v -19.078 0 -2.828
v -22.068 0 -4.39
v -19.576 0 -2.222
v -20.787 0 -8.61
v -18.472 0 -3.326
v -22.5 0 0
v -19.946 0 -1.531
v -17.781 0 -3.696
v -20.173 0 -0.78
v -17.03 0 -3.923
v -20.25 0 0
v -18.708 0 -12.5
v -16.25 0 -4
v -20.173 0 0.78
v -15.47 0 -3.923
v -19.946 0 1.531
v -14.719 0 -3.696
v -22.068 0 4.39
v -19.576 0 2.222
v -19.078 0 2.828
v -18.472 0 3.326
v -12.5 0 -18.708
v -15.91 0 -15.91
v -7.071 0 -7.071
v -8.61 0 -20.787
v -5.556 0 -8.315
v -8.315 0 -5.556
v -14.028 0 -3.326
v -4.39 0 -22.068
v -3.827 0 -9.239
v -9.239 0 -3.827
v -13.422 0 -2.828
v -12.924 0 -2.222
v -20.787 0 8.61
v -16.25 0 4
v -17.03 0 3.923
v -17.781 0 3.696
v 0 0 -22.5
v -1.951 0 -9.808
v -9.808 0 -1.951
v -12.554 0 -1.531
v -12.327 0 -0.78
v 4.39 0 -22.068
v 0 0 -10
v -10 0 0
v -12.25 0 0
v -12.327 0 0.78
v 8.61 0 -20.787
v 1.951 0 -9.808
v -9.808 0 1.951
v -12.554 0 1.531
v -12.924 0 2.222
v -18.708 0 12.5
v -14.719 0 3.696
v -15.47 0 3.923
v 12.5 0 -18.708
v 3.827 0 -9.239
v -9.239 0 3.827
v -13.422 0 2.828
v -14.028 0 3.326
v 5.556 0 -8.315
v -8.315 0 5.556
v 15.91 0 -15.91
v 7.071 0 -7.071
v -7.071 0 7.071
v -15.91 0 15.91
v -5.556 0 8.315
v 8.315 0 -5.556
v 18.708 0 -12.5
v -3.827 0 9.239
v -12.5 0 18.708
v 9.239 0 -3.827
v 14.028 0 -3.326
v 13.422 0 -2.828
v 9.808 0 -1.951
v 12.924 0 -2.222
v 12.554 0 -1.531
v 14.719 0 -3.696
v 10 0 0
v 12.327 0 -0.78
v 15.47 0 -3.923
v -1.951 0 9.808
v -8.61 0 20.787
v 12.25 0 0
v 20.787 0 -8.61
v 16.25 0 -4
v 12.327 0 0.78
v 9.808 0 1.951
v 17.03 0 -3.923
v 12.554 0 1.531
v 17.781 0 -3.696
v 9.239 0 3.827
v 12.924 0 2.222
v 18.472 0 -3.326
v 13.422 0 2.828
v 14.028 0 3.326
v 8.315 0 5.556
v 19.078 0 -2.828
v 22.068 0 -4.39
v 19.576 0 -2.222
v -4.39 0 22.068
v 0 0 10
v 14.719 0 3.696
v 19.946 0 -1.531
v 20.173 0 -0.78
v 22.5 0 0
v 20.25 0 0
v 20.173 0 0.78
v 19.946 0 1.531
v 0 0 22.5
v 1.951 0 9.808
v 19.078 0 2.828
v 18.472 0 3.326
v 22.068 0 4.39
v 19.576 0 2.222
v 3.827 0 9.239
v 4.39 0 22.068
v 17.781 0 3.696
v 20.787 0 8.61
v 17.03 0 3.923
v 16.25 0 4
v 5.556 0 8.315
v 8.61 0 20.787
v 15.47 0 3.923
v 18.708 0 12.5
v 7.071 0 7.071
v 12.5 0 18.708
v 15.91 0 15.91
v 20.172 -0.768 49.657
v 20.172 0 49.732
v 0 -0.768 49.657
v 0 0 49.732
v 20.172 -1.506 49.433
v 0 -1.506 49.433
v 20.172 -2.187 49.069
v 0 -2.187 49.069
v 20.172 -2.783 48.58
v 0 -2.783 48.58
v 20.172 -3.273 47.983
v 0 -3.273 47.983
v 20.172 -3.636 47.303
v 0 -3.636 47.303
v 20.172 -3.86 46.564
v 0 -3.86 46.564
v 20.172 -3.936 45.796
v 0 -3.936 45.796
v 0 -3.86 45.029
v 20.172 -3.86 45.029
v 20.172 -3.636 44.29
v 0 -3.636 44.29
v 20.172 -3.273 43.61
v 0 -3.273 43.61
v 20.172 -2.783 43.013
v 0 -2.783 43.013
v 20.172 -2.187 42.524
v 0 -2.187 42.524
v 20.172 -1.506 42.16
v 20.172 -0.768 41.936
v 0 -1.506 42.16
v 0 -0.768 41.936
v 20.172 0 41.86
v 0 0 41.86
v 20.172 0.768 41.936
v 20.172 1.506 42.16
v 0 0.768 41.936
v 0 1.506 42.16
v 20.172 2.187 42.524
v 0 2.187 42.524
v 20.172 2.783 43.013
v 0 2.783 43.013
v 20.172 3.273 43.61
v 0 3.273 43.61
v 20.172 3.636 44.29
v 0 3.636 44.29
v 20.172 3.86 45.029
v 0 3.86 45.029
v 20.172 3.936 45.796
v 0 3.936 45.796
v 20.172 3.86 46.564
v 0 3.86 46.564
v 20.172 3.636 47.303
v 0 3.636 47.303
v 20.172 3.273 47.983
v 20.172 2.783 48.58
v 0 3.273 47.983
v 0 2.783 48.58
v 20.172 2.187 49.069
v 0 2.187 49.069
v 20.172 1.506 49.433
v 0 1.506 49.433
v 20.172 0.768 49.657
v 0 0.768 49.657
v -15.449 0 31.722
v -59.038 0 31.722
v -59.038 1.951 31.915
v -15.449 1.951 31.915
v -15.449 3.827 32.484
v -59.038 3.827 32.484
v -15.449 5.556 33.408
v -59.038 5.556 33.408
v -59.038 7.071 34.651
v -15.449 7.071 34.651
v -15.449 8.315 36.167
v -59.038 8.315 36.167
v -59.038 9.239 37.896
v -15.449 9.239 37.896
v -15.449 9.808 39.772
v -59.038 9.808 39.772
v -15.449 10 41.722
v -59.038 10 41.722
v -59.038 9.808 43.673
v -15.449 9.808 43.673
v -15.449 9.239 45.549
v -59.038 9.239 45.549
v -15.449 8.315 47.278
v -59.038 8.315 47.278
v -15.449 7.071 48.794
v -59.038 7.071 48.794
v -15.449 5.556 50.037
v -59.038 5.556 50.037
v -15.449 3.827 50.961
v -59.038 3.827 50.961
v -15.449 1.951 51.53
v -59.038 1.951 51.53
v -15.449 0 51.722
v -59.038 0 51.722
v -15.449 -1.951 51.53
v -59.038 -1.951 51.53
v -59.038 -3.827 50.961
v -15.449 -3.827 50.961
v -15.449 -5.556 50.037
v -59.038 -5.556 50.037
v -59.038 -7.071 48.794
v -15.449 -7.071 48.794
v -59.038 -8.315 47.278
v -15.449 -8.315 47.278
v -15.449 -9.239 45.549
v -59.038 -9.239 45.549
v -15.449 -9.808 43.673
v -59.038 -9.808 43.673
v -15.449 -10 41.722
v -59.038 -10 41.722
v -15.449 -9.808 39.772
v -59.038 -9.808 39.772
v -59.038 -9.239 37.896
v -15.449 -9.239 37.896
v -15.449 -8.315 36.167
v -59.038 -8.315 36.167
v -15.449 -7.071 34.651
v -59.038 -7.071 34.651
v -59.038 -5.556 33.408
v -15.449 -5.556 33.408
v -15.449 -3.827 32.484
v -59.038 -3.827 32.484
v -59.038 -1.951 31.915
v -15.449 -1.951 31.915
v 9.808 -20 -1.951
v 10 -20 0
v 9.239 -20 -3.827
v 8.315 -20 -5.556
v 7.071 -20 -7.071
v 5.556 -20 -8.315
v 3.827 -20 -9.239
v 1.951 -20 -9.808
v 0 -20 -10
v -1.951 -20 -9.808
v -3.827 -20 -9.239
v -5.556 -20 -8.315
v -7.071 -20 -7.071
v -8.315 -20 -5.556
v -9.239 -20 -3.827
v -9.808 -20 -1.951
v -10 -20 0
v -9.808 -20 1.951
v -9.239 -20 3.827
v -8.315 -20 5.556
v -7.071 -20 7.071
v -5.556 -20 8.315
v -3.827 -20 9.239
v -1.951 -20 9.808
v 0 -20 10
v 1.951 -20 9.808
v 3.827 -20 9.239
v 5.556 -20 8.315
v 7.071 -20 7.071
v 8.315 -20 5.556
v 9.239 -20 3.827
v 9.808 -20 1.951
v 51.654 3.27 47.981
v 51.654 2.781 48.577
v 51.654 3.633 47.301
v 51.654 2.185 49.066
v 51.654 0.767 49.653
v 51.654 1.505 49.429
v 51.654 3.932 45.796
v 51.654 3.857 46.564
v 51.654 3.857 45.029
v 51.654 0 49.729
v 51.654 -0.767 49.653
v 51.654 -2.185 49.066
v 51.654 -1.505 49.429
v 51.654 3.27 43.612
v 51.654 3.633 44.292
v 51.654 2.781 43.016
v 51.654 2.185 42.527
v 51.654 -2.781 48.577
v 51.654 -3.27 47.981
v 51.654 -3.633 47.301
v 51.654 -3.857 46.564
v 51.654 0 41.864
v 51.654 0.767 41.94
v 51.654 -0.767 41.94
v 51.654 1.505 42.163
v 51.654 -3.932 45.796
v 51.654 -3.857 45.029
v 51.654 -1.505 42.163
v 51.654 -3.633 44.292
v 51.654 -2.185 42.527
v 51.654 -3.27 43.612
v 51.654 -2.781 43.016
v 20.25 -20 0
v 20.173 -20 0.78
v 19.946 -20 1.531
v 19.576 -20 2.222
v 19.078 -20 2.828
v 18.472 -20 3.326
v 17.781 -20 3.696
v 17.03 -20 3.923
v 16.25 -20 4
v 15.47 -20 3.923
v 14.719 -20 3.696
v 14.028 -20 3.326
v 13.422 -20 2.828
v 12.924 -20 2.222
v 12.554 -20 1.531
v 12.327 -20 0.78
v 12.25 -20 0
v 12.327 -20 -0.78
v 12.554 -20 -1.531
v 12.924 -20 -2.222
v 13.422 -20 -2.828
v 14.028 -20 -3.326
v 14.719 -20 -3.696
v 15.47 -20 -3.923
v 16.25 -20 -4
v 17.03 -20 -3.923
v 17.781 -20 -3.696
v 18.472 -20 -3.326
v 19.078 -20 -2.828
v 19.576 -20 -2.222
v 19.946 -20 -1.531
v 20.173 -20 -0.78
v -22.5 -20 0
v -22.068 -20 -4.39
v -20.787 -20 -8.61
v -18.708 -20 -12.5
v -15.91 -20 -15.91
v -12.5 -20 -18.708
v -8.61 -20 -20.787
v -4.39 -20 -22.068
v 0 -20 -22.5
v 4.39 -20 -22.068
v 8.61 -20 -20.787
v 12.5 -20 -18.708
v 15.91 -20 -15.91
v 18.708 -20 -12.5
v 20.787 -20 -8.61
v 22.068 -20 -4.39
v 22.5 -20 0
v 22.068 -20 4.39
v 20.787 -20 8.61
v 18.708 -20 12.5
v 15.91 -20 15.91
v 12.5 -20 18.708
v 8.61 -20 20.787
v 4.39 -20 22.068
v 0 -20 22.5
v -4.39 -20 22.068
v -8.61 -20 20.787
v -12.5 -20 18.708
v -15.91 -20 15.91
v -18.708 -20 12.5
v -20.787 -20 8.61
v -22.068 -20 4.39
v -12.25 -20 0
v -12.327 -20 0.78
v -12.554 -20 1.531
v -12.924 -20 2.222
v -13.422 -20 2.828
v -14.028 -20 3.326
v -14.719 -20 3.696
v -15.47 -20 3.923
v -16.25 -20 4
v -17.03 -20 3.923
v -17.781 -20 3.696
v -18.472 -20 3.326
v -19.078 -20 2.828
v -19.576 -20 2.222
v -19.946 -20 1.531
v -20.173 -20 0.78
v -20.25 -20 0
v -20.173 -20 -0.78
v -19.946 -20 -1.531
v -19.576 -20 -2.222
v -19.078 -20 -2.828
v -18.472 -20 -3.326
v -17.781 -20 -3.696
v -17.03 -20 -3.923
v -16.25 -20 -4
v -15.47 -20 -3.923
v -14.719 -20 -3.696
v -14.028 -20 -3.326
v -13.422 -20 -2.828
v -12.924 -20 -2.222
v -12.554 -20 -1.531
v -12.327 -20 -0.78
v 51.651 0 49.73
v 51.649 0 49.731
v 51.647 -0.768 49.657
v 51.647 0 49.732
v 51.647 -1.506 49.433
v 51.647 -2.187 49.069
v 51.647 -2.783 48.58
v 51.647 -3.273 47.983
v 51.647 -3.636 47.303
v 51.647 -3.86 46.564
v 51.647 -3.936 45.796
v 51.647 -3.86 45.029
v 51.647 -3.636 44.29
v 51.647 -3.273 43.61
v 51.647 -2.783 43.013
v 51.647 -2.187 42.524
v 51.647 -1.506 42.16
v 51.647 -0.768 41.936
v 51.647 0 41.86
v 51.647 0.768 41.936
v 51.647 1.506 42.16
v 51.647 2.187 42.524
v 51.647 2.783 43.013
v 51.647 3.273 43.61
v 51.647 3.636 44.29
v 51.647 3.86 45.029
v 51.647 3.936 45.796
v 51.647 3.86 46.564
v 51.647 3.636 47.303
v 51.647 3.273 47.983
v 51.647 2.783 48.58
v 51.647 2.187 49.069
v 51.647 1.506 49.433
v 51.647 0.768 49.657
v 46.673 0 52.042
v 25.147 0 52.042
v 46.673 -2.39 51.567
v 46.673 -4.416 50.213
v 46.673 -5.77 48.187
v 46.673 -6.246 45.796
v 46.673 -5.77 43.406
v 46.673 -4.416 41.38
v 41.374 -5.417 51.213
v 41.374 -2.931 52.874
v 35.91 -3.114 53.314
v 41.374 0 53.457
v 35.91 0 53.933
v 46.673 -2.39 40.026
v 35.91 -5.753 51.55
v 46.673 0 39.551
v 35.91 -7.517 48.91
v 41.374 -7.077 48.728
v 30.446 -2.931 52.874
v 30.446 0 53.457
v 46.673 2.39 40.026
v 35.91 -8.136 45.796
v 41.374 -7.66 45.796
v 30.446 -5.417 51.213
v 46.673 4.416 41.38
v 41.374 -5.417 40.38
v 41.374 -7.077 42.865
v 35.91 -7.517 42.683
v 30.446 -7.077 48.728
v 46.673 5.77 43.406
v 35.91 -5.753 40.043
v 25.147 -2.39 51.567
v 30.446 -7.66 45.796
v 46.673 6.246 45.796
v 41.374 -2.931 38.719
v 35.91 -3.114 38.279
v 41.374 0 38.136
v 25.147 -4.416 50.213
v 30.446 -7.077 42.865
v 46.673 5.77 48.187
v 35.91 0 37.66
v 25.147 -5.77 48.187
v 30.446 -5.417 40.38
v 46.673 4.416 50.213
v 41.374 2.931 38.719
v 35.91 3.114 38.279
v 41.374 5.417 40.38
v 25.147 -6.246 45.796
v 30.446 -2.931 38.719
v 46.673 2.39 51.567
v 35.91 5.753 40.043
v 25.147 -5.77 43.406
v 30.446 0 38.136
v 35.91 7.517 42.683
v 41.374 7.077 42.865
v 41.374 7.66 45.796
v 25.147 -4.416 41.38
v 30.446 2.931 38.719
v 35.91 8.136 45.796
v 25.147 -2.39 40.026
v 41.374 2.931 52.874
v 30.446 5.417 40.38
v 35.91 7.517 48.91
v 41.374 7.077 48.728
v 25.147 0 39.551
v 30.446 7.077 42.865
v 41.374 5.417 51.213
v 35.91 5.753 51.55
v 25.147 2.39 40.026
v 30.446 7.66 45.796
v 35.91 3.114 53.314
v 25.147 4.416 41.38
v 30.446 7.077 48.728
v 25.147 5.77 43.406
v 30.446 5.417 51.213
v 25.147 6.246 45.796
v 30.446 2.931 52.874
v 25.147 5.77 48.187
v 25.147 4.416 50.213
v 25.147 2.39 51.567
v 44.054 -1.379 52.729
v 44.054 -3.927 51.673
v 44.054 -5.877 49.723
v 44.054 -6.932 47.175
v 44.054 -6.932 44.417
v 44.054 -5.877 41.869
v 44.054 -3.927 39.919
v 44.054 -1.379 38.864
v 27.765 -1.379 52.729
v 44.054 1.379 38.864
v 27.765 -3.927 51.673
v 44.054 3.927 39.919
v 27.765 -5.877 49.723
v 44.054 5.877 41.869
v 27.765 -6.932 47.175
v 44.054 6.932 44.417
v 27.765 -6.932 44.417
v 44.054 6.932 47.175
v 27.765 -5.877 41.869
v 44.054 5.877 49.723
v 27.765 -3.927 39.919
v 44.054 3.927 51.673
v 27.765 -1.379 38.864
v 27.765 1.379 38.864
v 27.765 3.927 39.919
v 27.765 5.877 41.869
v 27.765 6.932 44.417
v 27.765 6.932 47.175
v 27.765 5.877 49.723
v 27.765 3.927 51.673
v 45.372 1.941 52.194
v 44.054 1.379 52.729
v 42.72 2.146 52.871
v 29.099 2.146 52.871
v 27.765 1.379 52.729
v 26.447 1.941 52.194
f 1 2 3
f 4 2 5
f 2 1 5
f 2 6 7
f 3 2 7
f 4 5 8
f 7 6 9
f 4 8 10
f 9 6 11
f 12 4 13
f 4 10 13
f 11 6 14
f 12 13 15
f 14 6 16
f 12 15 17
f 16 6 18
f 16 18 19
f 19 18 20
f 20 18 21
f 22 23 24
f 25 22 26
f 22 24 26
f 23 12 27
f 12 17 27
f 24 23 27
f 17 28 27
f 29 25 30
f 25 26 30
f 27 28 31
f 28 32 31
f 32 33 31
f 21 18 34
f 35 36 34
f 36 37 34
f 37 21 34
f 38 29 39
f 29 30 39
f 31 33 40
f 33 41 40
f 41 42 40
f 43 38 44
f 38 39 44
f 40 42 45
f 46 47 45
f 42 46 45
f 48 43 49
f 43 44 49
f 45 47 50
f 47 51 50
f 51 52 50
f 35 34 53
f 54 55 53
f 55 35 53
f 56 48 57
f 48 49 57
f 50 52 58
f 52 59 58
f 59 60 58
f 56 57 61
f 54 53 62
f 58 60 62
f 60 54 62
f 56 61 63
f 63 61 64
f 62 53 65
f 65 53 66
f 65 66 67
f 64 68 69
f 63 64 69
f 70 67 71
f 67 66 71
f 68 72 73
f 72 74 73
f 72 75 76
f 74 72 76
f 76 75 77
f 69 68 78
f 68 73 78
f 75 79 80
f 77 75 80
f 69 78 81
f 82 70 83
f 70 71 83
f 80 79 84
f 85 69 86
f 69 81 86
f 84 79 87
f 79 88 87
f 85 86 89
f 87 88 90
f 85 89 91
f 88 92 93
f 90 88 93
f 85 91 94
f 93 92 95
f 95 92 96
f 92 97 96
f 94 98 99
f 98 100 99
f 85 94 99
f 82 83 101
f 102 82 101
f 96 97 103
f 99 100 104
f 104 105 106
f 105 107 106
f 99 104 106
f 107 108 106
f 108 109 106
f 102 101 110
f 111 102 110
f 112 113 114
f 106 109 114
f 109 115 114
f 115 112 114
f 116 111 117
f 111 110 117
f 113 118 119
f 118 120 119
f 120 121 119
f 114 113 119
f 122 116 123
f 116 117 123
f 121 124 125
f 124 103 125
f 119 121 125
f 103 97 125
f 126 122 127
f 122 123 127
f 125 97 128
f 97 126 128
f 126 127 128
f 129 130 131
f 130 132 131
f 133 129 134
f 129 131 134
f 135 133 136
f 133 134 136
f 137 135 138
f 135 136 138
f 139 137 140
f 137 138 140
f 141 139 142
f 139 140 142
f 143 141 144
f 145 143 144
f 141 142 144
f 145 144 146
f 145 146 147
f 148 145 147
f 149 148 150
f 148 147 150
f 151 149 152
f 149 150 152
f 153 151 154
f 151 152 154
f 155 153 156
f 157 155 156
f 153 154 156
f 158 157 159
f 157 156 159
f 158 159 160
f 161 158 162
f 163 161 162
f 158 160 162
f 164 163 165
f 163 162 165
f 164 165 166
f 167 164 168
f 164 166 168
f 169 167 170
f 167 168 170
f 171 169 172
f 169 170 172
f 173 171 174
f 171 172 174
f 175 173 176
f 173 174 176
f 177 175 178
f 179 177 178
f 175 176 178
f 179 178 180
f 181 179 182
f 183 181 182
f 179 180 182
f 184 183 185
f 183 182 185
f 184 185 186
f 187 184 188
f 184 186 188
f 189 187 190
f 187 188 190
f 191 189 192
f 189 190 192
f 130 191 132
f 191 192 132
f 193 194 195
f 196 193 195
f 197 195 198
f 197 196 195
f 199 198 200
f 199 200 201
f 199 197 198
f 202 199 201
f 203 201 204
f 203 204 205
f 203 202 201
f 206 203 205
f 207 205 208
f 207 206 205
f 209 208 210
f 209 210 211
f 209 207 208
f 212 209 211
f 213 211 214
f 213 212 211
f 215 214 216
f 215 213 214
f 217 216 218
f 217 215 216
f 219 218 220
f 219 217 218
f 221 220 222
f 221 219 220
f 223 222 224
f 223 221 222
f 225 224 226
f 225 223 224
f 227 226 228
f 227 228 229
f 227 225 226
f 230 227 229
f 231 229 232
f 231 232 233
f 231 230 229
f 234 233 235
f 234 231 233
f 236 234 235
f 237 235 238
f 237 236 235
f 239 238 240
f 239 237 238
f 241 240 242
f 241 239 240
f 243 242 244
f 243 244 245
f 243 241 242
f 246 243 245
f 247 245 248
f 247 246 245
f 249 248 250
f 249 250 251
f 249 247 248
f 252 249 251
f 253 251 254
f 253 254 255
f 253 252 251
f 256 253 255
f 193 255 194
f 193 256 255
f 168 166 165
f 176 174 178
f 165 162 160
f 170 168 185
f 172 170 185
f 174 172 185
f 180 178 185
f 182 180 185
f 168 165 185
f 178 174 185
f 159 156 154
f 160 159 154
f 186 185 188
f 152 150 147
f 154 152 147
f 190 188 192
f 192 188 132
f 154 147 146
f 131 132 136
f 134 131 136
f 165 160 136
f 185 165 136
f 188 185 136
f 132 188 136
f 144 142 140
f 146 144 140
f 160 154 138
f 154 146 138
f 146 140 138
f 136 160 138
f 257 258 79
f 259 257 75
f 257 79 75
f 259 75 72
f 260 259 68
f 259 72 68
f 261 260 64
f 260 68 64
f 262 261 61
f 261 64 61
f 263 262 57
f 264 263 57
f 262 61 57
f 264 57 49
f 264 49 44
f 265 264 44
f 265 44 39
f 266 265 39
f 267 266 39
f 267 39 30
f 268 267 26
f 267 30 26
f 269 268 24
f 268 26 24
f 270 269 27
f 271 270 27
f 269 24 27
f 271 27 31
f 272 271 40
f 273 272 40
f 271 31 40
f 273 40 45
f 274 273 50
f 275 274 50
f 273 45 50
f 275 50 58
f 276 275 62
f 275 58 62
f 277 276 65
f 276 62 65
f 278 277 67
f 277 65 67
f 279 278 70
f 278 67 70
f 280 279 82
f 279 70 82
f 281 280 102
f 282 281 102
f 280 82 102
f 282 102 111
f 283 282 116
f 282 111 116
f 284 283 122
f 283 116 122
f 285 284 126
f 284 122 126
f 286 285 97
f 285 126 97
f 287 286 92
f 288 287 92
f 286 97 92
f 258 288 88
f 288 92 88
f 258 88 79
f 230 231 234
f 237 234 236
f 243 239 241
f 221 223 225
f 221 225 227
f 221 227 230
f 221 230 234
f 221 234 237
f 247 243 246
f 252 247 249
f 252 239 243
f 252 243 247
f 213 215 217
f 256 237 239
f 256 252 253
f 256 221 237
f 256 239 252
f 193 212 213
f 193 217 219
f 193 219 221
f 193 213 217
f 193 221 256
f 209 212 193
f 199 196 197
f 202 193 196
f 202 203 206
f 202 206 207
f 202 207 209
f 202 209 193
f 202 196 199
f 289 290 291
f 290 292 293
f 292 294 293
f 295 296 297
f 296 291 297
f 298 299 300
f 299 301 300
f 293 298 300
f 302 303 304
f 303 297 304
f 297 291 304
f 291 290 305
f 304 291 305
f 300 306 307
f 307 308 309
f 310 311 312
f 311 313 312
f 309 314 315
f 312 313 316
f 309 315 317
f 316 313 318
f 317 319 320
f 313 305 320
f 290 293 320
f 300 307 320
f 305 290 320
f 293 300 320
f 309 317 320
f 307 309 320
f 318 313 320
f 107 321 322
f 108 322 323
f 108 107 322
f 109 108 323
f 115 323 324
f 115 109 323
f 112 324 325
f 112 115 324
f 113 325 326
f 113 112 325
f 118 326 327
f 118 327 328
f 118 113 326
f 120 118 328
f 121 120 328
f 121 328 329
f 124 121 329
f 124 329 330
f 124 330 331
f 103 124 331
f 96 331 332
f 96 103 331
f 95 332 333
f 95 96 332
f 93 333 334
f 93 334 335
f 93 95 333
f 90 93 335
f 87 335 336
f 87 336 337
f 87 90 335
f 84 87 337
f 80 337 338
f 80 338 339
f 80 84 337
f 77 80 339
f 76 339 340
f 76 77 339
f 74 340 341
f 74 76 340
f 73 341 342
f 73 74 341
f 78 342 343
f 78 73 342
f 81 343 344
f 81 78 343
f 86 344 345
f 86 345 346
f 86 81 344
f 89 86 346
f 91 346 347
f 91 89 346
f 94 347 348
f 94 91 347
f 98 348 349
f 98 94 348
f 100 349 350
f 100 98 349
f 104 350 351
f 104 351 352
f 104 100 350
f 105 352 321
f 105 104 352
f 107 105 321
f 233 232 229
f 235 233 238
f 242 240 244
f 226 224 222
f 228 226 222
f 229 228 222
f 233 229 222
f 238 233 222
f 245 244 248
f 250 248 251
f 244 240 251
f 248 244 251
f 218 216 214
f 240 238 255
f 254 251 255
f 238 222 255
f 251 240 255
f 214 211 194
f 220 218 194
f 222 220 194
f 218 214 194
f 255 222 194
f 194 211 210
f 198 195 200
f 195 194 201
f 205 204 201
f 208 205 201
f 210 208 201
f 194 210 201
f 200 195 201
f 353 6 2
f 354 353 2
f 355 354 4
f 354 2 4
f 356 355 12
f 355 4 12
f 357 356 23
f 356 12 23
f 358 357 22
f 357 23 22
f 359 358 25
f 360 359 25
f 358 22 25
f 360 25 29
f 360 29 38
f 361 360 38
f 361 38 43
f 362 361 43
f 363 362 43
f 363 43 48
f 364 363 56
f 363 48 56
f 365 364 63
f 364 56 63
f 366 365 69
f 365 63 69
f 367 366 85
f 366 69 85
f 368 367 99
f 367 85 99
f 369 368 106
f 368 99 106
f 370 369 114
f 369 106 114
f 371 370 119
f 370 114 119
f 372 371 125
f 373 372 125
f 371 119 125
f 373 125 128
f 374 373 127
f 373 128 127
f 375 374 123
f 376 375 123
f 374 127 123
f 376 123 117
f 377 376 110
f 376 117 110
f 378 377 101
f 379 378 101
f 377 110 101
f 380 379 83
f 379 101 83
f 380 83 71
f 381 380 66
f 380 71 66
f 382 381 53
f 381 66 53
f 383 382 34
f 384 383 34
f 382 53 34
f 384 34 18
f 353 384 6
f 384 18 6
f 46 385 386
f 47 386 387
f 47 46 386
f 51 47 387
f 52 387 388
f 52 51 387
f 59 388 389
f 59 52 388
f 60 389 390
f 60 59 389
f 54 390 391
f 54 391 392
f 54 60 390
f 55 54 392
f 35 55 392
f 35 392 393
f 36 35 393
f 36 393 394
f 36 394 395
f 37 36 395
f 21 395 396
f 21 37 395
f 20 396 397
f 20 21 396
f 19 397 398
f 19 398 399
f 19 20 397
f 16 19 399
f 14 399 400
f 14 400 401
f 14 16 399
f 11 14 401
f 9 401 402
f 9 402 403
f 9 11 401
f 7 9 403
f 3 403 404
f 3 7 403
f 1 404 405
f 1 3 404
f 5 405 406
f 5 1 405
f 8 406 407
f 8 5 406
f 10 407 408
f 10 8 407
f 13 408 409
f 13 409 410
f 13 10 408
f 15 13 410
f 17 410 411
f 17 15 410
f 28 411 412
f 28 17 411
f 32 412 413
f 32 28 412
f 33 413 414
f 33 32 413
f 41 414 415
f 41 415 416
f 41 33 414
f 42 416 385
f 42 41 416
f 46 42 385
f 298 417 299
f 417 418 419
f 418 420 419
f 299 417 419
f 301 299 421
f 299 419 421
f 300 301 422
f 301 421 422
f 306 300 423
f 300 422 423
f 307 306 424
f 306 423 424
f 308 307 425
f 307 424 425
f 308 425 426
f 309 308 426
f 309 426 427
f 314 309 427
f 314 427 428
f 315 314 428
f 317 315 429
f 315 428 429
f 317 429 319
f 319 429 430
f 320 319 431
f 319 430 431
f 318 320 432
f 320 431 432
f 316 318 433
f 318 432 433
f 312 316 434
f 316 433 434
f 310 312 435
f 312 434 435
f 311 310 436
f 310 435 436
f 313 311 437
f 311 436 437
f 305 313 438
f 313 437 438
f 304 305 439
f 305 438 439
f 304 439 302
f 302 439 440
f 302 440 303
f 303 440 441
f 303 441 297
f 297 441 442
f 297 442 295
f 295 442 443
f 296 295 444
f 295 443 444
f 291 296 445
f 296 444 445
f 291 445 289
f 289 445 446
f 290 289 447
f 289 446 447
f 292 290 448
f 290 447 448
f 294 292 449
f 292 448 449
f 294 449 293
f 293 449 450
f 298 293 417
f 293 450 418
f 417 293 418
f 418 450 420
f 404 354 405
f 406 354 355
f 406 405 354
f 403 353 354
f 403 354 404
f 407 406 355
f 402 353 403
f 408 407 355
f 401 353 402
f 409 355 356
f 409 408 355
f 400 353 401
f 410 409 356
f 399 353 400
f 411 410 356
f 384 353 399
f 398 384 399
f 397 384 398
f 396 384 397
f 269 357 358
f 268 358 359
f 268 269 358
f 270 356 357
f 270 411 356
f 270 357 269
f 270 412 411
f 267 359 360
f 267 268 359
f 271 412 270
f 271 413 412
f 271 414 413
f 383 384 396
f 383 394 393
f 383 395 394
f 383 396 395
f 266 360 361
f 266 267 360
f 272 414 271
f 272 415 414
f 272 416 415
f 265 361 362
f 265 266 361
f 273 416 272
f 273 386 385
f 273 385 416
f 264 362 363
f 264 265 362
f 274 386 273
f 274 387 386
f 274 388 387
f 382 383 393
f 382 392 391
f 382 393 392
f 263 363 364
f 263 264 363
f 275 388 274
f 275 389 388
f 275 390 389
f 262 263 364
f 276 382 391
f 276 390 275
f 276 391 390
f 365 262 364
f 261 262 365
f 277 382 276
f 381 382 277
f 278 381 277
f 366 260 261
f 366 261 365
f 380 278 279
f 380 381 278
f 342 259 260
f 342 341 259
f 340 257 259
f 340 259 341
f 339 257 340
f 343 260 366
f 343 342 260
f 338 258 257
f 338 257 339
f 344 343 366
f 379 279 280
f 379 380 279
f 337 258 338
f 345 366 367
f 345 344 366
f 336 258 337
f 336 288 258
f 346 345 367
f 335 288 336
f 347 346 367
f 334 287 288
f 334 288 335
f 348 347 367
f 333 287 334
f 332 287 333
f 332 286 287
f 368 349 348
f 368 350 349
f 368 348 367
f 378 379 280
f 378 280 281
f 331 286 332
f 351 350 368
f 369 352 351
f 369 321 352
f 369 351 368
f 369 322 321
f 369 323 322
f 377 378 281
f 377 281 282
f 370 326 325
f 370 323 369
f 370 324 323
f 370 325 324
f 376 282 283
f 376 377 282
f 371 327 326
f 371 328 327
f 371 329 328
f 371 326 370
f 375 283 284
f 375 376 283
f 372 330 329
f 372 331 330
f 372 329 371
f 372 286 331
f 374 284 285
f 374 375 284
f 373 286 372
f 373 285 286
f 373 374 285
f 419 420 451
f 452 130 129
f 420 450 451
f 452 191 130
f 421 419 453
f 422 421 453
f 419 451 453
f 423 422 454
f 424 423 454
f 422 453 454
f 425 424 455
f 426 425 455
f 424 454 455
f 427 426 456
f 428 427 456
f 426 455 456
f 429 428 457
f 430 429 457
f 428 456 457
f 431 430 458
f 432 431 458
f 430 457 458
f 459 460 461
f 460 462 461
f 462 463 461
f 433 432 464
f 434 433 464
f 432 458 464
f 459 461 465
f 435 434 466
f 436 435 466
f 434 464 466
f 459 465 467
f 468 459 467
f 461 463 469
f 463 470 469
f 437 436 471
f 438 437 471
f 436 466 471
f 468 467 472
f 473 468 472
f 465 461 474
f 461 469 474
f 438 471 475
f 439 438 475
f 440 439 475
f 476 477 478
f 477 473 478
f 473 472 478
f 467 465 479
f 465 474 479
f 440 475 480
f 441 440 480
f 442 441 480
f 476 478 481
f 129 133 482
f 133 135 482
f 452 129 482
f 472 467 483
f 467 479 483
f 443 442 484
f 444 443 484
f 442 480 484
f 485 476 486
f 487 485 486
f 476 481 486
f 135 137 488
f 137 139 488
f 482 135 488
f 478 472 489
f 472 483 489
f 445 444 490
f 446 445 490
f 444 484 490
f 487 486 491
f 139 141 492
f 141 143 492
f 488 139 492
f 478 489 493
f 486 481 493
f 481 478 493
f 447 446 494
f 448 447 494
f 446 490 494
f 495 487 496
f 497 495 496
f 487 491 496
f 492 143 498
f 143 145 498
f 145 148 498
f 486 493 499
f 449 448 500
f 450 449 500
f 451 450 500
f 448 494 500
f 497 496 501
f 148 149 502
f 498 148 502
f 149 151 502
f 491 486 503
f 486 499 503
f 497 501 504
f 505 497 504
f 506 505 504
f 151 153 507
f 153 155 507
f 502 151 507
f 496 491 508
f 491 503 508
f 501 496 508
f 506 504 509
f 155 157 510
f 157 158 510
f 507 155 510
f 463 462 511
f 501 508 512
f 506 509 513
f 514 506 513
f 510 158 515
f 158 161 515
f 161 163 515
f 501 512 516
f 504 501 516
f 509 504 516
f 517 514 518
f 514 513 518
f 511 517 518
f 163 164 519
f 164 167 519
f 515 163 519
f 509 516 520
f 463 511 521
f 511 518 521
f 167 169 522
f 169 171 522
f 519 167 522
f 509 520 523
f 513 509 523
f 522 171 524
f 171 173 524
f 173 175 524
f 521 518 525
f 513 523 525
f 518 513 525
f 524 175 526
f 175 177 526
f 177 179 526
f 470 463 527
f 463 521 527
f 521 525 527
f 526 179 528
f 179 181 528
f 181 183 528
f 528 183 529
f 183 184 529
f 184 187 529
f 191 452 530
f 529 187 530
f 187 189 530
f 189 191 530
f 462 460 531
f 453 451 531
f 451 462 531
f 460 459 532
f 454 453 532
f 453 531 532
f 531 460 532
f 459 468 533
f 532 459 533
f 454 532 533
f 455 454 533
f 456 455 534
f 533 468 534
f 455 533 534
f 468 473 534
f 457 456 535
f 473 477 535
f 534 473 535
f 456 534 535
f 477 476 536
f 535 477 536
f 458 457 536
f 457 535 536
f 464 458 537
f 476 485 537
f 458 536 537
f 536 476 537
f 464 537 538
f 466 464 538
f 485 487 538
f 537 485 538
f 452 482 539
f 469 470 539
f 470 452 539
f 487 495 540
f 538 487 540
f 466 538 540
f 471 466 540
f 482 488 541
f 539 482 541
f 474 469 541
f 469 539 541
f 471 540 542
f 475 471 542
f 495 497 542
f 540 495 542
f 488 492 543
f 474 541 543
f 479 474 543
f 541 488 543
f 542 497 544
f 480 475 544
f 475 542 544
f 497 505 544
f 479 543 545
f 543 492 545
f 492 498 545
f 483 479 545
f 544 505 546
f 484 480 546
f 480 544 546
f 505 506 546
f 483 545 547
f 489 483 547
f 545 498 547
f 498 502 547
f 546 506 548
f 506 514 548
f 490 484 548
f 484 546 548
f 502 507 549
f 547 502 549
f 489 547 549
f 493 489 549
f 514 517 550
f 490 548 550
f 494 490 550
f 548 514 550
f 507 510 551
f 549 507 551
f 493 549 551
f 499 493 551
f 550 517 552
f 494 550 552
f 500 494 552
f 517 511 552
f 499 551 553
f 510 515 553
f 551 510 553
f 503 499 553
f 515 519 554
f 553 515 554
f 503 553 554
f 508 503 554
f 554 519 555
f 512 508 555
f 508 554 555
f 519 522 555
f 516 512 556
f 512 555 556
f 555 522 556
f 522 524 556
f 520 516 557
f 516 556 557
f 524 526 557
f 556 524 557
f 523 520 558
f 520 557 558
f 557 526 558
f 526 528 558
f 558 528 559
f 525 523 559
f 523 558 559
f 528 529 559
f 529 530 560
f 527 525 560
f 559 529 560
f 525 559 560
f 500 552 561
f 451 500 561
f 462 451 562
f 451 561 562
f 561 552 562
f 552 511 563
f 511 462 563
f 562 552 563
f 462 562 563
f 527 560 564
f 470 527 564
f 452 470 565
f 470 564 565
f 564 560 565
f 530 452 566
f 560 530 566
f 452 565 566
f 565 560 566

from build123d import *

# Parameters (mm, degrees)
F0_R     = 4
F1_DEPTH = 20
F4_W     = 43.5897379518
F4_H     = 10


with BuildPart() as f1:
    # F0 (on Front) → F1 (new body)
    with BuildSketch(Plane.XZ):
        with BuildLine():
            ThreePointArc((10, 0), (16.25, 6.25), (22.5, 0))
            ThreePointArc((22.5, 0), (4.03e-08, 22.5), (-22.5, 8.06e-08))
            ThreePointArc((-22.5, 8.06e-08), (-16.2499999597, 6.25), (-10, 0))
            ThreePointArc((-10, 0), (0, 10), (10, 0))
        make_face()
        with BuildLine():
            ThreePointArc((10, 0), (16.25, -6.25), (22.5, 0))
            ThreePointArc((22.5, 0), (16.25, 6.25), (10, 0))
        make_face()
        with Locations((16.25, 0)):
            Circle(F0_R, mode=Mode.SUBTRACT)
        with BuildLine():
            ThreePointArc((-10, 0), (-16.2499999597, 6.25), (-22.5, 8.06e-08))
            ThreePointArc((-22.5, 8.06e-08), (-16.2500000403, -6.25), (-10, 0))
        make_face()
        with Locations((-16.25, 0)):
            Circle(F0_R, mode=Mode.SUBTRACT)
        with BuildLine():
            ThreePointArc((-22.5, 8.06e-08), (-4.03e-08, -22.5), (22.5, 0))
            ThreePointArc((22.5, 0), (16.25, -6.25), (10, 0))
            ThreePointArc((10, 0), (0, -10), (-10, 0))
            ThreePointArc((-10, 0), (-16.2500000403, -6.25), (-22.5, 8.06e-08))
        make_face()
    extrude(amount=F1_DEPTH)


with BuildPart() as f3:
    # F2 (on Front) → F3 (revolve)
    with BuildSketch(Plane.XZ):
        with BuildLine():
            Line((20.1721817479, 49.7323907912), (0, 49.7323907912))
            Line((0, 49.7323907912), (0, 45.7963943481))
            Line((0, 45.7963943481), (51.6536533833, 45.7963943481))
            Line((51.6536533833, 45.7963943481), (51.6536533833, 49.728649577))
            ThreePointArc((51.6536533833, 49.728649577), (51.6503998147, 49.7305203774), (51.6471460238, 49.7323907912))
            Line((51.6471460238, 49.7323907912), (20.1721817479, 49.7323907912))
        make_face()
        with BuildLine():
            ThreePointArc((51.6471460238, 49.7323907912), (35.9096638858, 53.9328531352), (20.1721817479, 49.7323907912))
            Line((20.1721817479, 49.7323907912), (51.6471460238, 49.7323907912))
        make_face()
    revolve(axis=Axis((25.8268266916, 0, 45.7963943481), (1, 0, 0)))


with BuildPart() as f5:
    # F4 (on Front) → F5 (revolve)
    with BuildSketch(Plane.XZ):
        with Locations((-37.2436190955, 36.7224626243)):
            Rectangle(F4_W, F4_H)
    revolve(axis=Axis((-37.2436190955, 0, 41.7224626243), (1, 0, 0)))


solid = Compound([f1.part, f3.part, f5.part])
